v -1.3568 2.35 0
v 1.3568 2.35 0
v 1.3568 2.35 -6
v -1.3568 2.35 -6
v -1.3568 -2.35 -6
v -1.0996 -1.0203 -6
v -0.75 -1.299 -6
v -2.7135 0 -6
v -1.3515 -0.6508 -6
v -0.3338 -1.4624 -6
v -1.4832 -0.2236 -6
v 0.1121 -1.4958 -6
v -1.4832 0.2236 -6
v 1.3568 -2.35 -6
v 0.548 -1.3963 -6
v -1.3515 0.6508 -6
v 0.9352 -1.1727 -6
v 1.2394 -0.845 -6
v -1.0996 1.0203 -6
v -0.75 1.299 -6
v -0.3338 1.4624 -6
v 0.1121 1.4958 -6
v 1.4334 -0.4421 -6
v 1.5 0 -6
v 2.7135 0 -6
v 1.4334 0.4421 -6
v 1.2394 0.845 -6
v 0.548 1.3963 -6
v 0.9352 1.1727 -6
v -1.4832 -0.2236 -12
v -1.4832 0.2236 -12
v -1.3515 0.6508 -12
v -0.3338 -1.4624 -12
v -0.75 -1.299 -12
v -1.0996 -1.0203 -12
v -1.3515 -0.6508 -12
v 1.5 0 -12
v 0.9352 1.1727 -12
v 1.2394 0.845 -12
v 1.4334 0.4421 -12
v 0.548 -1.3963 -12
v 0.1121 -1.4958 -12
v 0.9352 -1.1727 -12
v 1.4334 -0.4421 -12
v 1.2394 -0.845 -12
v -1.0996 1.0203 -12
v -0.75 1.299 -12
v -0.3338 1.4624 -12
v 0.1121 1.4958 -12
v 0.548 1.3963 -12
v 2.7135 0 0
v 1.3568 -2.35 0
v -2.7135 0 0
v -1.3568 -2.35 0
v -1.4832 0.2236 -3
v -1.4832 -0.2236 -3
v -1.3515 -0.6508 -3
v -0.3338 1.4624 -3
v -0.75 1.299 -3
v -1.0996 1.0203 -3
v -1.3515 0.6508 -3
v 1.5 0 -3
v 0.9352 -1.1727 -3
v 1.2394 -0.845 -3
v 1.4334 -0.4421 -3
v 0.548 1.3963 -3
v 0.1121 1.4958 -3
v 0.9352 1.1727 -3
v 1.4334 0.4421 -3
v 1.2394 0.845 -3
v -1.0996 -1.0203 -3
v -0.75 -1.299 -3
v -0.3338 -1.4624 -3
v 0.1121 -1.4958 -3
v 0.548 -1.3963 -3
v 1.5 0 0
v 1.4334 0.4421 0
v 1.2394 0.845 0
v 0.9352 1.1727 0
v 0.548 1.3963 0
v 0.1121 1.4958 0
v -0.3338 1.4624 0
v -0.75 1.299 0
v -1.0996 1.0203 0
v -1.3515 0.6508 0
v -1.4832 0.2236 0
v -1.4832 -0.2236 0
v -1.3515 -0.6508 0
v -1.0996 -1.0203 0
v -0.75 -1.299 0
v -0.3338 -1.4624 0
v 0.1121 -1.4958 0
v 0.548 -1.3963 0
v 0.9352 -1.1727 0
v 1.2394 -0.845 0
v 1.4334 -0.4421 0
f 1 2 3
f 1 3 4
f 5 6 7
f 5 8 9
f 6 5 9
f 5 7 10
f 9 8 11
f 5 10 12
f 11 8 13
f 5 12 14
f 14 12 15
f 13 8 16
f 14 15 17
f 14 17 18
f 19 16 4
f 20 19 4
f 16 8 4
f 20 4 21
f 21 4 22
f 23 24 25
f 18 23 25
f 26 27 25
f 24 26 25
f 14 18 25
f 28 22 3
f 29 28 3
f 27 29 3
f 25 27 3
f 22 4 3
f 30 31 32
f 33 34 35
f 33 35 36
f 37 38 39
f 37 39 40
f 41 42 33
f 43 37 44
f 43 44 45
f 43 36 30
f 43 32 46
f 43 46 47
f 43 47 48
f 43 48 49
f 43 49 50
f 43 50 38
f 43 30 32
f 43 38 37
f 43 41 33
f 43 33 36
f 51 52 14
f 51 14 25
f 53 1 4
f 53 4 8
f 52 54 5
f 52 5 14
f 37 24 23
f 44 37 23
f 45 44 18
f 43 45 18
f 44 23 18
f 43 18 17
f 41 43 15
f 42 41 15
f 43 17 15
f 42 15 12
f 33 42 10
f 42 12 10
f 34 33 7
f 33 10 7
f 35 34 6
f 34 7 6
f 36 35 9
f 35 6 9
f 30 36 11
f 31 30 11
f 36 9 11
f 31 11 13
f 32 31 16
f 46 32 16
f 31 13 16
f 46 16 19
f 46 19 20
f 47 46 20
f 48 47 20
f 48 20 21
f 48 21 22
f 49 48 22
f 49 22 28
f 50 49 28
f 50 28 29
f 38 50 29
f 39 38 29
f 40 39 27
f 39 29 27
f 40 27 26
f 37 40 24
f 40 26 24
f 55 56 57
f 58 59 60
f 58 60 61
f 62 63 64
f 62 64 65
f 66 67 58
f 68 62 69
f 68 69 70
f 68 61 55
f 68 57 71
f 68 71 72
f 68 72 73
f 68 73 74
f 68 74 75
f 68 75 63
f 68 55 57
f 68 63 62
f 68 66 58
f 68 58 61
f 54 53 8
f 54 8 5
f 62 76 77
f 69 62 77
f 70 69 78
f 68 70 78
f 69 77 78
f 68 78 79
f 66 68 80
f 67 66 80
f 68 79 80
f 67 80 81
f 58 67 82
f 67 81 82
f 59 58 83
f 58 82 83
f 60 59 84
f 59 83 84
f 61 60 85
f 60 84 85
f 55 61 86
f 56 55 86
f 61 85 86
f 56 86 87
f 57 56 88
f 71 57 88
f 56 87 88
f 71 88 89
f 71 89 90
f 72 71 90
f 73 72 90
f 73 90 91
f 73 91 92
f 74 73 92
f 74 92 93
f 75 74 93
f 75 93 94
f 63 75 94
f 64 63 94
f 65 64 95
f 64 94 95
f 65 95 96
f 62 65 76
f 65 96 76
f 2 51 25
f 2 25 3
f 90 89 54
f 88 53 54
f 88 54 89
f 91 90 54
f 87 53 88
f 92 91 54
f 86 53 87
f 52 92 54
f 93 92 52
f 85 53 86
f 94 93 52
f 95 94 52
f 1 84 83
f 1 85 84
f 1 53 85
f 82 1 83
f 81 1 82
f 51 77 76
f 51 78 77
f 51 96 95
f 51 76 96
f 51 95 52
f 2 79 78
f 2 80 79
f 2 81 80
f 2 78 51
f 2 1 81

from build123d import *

# Parameters (mm, degrees)
EXTRUDE_1_DEPTH     = 6
SKETCH_2_R          = 1.5
CUT_EXTRUDE_1_DEPTH = 3
SKETCH_3_R          = 1.5
EXTRUDE_2_DEPTH     = 6


with BuildPart() as part:
    # 草图1 → 凸台-拉伸1 (new body)
    with BuildSketch(Plane.XY):
        Polygon((2.713546265, 0), (1.356773133, 2.35), (-1.356773133, 2.35), (-2.713546265, 0), (-1.356773133, -2.35), (1.356773133, -2.35), align=None)
    extrude(amount=-EXTRUDE_1_DEPTH)

    # 草图2 → 切除-拉伸1 (cut)
    with BuildSketch(Plane.XY):
        Circle(SKETCH_2_R)
    extrude(amount=-CUT_EXTRUDE_1_DEPTH, mode=Mode.SUBTRACT)

    # 草图3 → 凸台-拉伸2 (add)
    with BuildSketch(Plane(origin=(0, 0, -6), x_dir=(-1, 0, 0), z_dir=(0, 0, -1))):
        with Locations(Location((0, 0, 0), (0, 0, 180))):
            Circle(SKETCH_3_R)
    extrude(amount=EXTRUDE_2_DEPTH)


solid = part.part
